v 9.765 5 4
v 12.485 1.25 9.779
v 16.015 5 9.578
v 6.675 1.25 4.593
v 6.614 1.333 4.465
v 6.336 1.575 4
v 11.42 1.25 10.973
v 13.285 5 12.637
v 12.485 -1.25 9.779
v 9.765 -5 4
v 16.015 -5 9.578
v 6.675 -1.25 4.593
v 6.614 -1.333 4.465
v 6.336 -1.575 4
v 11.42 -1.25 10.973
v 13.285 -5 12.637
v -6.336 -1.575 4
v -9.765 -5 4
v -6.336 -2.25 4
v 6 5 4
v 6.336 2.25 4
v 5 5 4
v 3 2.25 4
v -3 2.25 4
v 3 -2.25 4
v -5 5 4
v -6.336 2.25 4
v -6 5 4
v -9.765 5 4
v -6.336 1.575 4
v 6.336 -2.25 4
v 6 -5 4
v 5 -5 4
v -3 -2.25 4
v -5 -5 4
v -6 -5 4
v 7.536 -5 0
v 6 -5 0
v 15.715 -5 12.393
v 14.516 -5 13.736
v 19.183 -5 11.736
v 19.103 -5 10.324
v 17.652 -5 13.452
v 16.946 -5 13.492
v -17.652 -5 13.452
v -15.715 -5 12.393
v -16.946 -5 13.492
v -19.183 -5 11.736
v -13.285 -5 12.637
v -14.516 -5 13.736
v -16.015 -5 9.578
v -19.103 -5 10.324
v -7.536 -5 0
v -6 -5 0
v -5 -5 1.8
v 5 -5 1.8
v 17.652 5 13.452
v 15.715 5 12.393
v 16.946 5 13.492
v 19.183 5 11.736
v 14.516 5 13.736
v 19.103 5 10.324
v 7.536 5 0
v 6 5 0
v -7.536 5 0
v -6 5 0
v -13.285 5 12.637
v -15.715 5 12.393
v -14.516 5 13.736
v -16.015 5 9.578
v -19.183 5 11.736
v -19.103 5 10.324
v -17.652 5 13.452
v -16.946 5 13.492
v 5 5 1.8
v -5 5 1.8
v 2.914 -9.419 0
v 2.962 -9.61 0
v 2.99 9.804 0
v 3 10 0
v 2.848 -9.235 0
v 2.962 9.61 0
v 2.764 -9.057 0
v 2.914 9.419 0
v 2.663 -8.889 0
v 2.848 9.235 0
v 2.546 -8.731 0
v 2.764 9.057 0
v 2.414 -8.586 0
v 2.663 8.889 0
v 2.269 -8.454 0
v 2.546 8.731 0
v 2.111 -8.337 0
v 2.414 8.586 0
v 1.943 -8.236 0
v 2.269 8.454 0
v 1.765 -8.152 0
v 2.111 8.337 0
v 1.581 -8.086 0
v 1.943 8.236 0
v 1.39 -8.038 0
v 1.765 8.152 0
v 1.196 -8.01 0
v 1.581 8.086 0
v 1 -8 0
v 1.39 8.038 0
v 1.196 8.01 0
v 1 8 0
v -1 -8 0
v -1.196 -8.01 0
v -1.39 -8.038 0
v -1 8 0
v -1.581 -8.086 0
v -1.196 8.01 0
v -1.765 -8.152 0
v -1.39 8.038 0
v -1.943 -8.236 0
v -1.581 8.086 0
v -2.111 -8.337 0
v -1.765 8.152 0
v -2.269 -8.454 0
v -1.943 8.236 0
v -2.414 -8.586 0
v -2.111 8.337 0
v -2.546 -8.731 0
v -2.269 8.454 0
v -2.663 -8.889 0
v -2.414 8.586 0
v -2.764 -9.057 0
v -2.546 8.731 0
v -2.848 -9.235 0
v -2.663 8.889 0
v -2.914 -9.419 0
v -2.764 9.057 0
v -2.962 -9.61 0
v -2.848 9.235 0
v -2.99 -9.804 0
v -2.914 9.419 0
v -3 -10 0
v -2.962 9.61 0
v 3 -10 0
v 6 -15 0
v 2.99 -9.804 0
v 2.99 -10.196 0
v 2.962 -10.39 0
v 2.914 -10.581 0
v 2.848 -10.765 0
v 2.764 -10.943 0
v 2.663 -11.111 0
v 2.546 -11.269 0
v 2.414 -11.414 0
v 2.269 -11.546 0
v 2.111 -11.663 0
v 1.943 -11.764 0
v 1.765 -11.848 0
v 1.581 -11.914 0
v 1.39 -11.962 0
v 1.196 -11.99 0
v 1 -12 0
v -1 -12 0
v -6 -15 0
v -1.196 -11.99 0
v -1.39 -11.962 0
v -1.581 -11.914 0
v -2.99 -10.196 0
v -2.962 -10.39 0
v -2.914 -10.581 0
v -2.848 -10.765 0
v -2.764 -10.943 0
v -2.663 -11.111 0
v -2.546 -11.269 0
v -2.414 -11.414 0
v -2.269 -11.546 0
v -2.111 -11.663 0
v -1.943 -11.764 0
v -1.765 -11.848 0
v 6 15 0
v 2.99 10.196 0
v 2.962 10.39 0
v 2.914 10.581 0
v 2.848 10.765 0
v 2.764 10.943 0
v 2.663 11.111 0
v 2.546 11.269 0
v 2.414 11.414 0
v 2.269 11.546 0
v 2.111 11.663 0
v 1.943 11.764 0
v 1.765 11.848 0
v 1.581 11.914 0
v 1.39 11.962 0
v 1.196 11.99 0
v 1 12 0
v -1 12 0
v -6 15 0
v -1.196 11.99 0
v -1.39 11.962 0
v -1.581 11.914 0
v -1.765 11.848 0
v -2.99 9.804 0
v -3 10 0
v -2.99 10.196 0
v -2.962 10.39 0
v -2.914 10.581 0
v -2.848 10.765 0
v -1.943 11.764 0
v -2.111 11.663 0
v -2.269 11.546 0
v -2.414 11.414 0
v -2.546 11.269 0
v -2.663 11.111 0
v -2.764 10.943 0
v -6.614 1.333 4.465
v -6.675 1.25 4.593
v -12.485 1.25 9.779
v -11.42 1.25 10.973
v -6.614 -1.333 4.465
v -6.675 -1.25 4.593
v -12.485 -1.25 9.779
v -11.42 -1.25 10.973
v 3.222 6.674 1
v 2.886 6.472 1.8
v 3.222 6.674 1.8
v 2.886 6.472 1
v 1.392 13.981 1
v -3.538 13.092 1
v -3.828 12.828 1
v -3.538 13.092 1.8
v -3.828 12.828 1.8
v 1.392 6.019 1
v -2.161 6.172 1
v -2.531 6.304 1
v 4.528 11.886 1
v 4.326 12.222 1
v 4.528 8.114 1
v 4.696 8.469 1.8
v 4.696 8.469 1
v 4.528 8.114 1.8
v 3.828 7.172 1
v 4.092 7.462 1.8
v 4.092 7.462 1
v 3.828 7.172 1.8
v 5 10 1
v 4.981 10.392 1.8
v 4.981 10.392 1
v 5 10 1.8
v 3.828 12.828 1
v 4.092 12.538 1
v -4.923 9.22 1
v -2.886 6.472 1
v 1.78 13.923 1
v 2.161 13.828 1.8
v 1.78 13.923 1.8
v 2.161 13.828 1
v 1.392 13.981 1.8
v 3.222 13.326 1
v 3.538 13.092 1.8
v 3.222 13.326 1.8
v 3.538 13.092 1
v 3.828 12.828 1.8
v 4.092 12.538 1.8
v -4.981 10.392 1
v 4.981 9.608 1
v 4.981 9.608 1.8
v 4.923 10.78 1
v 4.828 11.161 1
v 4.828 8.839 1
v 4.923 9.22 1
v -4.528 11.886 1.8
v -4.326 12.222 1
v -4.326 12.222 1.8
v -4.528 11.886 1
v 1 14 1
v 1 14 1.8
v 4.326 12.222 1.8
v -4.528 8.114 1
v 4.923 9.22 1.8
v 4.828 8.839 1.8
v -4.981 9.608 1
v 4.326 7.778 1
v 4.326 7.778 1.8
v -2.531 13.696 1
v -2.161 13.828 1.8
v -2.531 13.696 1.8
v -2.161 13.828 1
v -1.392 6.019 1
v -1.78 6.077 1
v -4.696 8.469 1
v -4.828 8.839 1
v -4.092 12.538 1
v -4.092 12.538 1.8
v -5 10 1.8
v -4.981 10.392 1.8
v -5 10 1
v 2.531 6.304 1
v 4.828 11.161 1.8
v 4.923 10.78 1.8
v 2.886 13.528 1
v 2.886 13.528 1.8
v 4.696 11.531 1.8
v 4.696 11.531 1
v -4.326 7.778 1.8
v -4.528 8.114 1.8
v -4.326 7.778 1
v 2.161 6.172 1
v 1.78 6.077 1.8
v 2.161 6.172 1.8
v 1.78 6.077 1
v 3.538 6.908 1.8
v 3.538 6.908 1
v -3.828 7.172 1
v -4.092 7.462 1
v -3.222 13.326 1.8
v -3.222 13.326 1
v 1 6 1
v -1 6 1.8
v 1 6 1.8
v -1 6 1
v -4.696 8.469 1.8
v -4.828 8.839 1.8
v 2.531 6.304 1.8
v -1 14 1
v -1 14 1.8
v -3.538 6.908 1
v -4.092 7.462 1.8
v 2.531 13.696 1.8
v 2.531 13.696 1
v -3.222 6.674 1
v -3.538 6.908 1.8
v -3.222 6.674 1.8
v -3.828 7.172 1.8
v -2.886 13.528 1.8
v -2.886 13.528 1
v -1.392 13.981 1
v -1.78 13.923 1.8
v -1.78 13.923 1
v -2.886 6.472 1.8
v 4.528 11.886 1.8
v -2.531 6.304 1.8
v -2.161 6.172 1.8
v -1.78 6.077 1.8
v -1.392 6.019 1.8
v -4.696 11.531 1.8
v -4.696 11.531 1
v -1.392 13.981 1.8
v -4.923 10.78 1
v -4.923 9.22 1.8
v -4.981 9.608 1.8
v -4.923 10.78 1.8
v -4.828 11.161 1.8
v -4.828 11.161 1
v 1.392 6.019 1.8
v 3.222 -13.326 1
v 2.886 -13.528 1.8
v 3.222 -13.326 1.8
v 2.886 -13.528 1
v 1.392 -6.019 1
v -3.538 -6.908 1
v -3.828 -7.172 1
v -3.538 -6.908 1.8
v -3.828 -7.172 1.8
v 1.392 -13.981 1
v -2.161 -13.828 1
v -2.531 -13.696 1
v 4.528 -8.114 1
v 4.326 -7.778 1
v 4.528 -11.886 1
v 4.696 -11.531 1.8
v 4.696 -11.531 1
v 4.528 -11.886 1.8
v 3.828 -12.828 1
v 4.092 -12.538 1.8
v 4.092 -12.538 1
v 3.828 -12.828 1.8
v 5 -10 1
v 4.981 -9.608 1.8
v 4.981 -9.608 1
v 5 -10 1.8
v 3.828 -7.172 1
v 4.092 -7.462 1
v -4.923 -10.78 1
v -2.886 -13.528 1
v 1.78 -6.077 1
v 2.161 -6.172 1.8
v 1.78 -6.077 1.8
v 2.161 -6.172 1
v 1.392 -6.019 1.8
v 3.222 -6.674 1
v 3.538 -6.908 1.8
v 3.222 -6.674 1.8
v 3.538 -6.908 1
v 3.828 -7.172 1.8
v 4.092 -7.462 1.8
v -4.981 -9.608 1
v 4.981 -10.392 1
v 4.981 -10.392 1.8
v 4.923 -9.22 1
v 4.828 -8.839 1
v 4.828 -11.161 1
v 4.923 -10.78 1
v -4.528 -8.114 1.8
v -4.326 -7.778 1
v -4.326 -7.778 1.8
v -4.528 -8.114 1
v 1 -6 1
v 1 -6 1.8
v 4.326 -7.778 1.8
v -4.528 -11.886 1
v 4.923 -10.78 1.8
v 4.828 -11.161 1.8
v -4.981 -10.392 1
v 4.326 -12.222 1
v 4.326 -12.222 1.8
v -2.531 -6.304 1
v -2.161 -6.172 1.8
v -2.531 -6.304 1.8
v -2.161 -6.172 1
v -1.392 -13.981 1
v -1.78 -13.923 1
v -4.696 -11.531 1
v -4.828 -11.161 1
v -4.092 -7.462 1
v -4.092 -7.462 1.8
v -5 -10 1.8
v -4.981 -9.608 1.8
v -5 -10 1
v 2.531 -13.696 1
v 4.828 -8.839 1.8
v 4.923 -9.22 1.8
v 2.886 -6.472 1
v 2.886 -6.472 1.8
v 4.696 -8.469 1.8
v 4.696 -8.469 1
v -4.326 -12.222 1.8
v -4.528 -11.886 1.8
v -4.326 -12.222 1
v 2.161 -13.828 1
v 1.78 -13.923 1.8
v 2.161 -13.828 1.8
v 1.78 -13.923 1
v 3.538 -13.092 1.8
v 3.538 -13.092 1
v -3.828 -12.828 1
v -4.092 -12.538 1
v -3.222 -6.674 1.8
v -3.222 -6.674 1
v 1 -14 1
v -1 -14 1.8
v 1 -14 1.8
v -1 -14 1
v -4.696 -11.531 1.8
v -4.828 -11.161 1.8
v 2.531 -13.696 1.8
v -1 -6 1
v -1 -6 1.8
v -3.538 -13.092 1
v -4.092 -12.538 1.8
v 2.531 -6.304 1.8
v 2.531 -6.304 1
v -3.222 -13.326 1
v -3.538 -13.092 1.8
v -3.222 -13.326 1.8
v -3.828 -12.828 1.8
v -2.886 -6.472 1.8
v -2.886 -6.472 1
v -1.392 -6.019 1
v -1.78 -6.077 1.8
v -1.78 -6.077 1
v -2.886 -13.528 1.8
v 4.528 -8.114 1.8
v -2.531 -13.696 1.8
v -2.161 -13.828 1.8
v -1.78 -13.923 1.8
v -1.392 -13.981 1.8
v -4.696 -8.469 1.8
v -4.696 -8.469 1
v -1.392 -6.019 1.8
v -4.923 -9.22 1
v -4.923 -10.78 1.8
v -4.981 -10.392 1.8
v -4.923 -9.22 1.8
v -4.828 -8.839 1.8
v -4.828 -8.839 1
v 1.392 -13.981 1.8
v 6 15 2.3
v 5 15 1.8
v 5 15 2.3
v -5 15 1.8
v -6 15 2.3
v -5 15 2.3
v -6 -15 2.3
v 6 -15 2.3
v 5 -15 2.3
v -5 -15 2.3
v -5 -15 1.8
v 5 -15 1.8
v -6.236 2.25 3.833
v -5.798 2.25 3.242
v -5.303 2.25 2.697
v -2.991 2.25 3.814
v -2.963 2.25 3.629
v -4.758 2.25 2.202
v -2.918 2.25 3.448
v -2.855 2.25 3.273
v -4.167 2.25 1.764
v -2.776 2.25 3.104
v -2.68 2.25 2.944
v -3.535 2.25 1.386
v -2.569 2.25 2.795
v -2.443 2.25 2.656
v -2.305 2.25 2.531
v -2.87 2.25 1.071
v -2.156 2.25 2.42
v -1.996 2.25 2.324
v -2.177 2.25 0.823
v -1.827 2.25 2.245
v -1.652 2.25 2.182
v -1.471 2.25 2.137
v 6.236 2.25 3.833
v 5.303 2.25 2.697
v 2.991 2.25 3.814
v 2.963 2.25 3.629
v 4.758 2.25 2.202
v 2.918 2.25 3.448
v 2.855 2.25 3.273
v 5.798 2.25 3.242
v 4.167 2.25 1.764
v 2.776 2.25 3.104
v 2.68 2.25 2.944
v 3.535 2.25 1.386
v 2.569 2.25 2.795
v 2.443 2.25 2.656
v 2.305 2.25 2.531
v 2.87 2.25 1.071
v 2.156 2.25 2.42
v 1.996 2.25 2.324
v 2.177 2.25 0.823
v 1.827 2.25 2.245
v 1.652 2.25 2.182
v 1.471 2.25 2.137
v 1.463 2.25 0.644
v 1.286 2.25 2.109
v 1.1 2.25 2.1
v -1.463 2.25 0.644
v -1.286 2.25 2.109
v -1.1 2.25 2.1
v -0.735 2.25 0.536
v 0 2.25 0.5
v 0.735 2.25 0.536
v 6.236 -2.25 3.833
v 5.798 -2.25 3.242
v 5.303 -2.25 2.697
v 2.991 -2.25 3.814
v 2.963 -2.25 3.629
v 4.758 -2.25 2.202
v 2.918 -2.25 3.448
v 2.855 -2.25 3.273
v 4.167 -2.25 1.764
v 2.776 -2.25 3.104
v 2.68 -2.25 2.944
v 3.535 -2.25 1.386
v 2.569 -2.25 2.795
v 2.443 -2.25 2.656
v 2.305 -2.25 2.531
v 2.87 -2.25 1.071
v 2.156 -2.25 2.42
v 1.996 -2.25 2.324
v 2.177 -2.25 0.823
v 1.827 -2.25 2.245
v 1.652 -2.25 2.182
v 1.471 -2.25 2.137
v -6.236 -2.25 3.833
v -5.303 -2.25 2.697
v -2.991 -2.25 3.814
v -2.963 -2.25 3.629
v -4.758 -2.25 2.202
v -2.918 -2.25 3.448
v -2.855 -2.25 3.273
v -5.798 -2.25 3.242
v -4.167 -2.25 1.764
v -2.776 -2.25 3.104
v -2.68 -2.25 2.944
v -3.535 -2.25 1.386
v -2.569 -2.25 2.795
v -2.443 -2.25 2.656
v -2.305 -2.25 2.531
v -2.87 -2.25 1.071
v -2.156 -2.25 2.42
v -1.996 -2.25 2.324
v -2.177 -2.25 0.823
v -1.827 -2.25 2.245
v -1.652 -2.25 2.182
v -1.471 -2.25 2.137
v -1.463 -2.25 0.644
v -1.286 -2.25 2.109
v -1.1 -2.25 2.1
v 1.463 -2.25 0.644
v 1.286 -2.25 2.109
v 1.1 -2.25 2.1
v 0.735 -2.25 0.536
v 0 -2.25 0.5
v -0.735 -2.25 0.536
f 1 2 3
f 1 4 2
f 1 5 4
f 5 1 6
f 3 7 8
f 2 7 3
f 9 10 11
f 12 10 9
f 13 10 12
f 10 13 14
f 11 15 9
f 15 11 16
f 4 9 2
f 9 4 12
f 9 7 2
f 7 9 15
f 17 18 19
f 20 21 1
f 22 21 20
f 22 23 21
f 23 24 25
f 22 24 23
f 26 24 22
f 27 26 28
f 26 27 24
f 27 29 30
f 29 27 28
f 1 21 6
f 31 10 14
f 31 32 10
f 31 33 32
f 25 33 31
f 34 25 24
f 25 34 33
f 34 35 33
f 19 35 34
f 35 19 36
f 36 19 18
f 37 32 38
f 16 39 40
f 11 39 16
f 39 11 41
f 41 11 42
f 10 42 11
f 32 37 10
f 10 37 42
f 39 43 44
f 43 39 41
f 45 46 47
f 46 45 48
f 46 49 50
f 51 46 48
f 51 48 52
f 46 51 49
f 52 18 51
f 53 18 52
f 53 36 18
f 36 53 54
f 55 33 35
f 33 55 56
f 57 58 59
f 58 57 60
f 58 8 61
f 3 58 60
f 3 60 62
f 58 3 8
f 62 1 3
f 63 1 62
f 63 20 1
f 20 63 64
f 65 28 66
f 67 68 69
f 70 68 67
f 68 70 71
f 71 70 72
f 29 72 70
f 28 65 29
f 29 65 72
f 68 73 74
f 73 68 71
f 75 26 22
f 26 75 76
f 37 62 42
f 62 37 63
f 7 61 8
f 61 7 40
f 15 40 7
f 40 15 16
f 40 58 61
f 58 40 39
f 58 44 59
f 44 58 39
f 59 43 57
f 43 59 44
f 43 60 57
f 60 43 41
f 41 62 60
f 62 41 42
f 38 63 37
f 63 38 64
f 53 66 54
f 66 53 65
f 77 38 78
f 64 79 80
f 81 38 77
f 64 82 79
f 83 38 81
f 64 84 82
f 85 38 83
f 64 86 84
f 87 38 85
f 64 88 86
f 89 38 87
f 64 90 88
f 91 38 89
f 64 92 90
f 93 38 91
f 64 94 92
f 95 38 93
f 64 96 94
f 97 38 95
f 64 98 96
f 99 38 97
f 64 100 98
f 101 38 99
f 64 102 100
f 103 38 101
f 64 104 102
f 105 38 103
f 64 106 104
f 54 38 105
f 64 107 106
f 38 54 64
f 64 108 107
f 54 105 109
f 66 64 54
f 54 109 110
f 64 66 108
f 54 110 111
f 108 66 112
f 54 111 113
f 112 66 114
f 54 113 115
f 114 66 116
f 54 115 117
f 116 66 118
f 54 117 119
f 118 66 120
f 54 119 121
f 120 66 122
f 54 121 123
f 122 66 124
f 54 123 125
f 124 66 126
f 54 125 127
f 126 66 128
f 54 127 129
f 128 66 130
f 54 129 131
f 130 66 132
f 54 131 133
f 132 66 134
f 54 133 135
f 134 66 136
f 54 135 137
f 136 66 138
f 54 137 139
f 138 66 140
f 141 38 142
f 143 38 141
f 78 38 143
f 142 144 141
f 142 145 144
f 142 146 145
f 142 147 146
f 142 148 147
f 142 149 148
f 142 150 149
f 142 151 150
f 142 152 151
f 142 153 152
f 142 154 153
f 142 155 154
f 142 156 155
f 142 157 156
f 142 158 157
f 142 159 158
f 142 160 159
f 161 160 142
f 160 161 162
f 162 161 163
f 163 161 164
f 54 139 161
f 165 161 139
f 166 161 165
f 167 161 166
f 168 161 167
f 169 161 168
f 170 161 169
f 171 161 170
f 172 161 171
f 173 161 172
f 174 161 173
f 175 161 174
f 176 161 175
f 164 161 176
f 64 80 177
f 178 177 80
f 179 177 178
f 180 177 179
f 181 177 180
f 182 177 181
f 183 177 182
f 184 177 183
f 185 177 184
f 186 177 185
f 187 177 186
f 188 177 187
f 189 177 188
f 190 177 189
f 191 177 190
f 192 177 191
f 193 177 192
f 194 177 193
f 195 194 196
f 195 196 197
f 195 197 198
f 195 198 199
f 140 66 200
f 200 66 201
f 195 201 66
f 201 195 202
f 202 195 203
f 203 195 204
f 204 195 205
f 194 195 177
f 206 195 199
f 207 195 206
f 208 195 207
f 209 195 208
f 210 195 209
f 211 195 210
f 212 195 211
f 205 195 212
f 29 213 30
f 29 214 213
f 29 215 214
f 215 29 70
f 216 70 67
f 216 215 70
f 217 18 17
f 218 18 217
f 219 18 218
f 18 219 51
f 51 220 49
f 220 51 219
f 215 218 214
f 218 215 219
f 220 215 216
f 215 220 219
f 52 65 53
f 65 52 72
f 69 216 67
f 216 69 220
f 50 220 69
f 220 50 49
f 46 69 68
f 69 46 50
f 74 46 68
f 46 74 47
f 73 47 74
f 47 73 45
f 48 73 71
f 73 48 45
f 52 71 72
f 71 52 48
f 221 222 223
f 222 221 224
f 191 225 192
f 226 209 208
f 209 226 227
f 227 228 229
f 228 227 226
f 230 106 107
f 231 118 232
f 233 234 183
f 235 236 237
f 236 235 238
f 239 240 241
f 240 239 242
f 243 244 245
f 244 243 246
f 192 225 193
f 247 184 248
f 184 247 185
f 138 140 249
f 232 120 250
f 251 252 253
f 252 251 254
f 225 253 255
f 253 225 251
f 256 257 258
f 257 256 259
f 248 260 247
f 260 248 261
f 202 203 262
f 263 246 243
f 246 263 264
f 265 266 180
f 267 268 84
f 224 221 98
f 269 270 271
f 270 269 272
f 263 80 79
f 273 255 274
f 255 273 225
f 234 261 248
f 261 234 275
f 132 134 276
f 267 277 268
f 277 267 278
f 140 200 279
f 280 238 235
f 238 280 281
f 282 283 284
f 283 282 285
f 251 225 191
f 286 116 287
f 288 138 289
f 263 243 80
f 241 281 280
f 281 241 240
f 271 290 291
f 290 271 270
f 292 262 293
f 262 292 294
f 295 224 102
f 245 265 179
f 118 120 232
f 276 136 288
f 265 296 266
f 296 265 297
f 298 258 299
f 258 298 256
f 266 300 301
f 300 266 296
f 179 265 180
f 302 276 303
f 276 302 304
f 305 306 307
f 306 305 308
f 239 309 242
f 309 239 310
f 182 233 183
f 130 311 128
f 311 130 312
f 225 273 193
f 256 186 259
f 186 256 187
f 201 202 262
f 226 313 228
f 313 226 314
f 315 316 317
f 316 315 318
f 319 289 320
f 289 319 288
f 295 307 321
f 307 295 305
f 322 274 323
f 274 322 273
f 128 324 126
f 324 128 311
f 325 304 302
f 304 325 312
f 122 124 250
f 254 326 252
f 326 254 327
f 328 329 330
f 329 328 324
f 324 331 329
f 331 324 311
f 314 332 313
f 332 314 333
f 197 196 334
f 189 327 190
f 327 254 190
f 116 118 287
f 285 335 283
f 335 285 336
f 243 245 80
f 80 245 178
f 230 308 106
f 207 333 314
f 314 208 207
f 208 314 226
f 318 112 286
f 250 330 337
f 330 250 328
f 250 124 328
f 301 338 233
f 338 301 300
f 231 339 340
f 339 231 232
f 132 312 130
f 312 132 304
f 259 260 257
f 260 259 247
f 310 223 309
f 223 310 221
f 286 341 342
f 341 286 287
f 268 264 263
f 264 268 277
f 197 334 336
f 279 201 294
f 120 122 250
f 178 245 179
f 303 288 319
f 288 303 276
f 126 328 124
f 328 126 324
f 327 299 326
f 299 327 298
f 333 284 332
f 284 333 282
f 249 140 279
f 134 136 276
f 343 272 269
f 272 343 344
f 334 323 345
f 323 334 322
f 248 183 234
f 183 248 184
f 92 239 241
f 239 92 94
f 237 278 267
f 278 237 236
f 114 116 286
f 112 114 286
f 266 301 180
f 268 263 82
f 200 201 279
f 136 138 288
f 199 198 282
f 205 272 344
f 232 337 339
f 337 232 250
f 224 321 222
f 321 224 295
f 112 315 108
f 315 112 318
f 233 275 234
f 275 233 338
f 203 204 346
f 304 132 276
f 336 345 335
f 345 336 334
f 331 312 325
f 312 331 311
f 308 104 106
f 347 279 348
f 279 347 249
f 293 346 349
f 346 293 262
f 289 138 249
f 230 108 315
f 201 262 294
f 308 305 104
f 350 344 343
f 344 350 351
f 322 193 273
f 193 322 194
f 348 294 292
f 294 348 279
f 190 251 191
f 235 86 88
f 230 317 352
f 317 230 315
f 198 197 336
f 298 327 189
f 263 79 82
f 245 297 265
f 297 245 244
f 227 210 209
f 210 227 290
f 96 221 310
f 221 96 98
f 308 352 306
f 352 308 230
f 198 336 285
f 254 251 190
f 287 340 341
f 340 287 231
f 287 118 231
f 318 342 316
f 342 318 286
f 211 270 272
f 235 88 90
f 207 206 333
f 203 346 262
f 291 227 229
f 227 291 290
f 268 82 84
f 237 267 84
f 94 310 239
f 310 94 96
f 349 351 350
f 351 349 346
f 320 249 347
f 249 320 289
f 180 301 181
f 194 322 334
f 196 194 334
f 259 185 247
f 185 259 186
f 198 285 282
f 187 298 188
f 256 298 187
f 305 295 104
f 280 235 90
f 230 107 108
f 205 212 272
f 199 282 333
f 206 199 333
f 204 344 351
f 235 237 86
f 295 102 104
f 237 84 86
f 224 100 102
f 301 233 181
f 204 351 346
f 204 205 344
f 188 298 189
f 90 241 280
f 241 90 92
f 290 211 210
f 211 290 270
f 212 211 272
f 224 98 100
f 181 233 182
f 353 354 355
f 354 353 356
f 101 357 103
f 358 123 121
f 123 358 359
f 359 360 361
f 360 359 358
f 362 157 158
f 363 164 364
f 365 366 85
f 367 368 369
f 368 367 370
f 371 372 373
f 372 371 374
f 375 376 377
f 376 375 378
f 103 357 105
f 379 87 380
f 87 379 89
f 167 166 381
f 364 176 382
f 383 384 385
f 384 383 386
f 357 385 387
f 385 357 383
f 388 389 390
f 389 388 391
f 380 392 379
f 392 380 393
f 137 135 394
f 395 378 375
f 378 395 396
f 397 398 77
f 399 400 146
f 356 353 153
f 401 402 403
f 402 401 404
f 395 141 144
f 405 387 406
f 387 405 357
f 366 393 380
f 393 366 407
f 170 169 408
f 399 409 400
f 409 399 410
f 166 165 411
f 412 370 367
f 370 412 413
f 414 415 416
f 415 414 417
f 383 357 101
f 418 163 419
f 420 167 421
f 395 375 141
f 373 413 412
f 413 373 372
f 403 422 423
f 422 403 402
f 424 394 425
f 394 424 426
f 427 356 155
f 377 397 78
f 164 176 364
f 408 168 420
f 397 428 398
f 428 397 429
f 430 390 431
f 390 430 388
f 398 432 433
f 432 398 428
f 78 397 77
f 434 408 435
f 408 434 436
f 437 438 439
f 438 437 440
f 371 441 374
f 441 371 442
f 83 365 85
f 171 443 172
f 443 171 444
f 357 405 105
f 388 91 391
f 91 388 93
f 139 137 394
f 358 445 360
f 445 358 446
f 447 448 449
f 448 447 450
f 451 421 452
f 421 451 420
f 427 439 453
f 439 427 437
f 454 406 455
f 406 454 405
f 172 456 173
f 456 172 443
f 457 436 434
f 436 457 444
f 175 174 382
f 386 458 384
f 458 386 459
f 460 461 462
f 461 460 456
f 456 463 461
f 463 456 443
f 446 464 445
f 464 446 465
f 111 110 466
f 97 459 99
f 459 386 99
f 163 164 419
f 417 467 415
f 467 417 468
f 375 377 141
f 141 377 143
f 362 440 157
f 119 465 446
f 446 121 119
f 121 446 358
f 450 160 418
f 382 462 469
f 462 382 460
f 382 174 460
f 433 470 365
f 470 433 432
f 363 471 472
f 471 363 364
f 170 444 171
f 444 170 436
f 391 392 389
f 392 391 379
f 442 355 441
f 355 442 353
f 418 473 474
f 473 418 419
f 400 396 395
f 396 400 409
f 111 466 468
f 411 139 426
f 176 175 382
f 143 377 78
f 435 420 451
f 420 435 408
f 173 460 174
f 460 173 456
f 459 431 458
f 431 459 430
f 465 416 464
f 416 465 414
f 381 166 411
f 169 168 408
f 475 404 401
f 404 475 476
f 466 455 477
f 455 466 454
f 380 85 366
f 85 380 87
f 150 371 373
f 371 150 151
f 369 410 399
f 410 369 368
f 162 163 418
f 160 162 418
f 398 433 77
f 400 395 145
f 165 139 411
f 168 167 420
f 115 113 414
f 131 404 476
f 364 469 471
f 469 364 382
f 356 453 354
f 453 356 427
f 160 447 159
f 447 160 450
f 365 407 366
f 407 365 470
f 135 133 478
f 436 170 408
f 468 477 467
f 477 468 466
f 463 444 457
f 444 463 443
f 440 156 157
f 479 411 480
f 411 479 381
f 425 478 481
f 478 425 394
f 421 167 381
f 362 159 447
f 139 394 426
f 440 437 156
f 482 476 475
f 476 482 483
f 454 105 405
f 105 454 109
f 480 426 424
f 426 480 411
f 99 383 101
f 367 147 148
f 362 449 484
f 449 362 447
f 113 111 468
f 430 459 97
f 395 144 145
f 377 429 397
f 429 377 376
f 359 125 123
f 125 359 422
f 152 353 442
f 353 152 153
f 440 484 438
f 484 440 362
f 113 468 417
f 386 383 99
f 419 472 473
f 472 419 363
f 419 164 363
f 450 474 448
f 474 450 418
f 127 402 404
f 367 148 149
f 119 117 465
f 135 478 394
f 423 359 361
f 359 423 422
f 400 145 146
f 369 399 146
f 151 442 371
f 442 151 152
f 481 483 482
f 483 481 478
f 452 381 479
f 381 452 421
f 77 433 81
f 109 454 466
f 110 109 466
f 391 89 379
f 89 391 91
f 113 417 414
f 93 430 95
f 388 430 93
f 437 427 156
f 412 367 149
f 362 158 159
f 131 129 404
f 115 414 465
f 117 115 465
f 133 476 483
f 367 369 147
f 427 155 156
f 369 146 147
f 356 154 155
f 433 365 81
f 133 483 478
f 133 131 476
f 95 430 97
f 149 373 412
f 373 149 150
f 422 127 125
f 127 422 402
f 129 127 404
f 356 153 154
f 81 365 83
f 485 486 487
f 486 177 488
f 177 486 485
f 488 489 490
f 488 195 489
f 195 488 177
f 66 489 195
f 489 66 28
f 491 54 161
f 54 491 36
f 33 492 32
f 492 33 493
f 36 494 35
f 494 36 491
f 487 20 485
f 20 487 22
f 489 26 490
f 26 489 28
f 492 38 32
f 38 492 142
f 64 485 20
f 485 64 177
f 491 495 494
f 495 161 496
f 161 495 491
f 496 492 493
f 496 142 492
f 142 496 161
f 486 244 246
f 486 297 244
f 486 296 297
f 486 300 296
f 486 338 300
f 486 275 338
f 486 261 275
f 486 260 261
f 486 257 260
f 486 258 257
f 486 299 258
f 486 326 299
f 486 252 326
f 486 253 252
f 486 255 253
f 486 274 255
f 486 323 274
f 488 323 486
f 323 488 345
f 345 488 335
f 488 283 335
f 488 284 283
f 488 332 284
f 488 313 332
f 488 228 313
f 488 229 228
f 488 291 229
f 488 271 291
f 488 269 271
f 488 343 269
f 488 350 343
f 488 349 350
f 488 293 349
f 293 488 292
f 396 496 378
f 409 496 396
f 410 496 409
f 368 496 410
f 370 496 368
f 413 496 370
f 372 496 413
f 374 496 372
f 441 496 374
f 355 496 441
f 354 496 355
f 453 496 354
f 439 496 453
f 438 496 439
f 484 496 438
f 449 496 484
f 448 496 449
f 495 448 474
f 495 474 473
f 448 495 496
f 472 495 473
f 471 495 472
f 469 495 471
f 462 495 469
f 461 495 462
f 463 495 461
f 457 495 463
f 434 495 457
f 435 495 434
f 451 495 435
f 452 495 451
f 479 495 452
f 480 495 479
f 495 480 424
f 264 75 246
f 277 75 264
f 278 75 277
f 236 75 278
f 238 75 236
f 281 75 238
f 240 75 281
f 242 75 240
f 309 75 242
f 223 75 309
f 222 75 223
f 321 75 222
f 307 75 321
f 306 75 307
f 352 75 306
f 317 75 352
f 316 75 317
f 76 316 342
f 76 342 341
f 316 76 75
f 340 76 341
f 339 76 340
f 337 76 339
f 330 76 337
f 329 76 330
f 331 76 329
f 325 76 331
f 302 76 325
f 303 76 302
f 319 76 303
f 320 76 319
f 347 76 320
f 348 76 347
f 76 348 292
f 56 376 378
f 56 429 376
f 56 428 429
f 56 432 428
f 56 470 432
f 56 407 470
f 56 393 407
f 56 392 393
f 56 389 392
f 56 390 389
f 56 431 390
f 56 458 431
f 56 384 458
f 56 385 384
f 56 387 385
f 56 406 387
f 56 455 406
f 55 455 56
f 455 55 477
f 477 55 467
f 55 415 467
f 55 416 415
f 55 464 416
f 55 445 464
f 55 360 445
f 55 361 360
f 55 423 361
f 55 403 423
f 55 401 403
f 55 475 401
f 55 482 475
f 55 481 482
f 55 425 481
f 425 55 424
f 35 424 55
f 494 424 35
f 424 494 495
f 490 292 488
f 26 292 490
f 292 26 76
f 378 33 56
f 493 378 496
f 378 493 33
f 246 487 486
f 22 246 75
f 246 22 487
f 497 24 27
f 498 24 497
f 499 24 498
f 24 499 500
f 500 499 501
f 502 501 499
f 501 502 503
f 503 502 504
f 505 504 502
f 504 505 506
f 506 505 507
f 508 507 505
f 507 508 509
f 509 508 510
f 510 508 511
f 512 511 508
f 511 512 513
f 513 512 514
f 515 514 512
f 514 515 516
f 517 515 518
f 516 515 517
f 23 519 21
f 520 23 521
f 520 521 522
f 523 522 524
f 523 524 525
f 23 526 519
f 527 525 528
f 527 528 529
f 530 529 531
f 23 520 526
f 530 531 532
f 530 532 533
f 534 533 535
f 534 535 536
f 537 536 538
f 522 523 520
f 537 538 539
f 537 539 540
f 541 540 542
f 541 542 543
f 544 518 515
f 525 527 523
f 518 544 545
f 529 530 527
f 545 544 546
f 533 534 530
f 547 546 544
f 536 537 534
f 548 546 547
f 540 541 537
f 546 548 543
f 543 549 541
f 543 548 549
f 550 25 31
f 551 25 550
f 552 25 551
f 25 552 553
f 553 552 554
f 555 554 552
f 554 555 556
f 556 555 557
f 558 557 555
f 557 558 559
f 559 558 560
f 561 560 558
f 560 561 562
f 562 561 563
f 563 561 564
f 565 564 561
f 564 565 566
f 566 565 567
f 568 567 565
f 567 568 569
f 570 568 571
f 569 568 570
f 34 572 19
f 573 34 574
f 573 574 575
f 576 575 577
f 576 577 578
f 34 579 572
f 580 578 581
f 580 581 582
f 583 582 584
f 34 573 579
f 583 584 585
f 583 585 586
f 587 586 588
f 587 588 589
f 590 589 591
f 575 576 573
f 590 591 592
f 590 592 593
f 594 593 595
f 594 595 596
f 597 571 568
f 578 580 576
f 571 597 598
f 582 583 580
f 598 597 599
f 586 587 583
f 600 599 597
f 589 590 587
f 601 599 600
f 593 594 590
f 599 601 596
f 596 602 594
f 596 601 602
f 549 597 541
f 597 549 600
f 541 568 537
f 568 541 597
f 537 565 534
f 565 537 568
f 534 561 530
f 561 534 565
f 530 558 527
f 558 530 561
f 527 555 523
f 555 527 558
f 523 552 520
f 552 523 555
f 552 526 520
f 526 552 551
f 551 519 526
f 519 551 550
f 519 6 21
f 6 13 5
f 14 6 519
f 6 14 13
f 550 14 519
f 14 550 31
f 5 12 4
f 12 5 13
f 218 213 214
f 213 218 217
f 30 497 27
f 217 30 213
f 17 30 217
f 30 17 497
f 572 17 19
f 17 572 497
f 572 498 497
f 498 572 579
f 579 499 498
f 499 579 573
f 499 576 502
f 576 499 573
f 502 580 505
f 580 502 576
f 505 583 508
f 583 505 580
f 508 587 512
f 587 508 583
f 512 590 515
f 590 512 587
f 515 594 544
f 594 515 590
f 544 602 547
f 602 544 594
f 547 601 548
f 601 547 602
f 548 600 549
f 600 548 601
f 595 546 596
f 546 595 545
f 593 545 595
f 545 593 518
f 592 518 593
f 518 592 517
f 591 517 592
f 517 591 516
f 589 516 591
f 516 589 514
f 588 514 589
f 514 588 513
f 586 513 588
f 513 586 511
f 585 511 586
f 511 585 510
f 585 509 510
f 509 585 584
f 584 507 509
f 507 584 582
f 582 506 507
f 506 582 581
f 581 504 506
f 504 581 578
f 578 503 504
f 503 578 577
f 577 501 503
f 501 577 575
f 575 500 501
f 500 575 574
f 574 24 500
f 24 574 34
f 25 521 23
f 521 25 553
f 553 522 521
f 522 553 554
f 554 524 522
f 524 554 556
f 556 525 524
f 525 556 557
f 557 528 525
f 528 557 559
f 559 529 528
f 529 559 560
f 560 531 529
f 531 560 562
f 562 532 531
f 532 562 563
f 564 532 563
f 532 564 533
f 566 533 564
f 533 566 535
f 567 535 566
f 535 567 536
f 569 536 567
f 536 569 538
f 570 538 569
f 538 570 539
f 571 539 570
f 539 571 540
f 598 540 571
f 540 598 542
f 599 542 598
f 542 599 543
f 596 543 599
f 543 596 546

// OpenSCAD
$fn = 64;

part = "mid"; // end, mid

a =  1.3; // ANGLE_PROFILE_THICKNESS
b =  1.0;
c =  2.0;
d =  1.8;
e =  1.5;
f =  1.0;
g =  0.5;
h =  1.5;
i =  2.5;
j = 10.0;
k =  2.5;
l =  part=="mid"?0.0:1.6;
m = 25.4; // ANGLE_PROFILE_SIZE
n =  4.0; // bottom
o =  1.8; // foot bottom

r = 10.0; // foot with
s =  1.0; // foot wall thickness
p = 20.0; // screw distancemodel
q =  0.5; // foot edge
u =  4.0;
k =  2.5;
v =  8.0;
w =  5.0;
aa = 0.0;
bb = 2.0; // screw slide
cc = d*2;

dd = 4.5; // ti-rib width
ee = 1.6; // ti-rib height
ff = 0.5; // ti-rib bottom
jj = 83.5; // ANGLE_PROFILE_ANGLE
jja = 90;
ii = 30.0;
gg =  6.0;
hh =  15.0;
kk = 4.0;

aa =  0.8;
ab =  7.25 - a;
ac =  2.5 - a;
ad = 22.8;
ae =  1.2;
ai = max(m, ad+ac*2)+1.5;
af = 0.8;
ag = 0.8;


case_inner_pcb_rotloc() rotate(180,[1,0,0]) rotate(90, [1,0,0]) {
    cube([ad,100.5, ae], center=true);
    translate([-5.77, -42.12, ae/2]) power_jack();
    translate([-2.18,23.74,-ae/2]) rotate(180, [1,0,0]) {
        linear_extrude(6.51) square([14.8,4.8],true);
    }
    #translate([6.42,-46.09, ae/2]) screw_terminal_2_45mm(3);
    translate([-8.63,45.60, ae/2]) rotate(180) {
        screw_terminal_2_45mm(2);
    }
    translate([-2.09,45.60, ae/2]) rotate(180) {
        screw_terminal_2_45mm(2);
    }
    translate([7.17,-20.44]) cylinder(d=1.5, h=20);
}

module screw_terminal_2_45mm(p=2,h1=5,h2=20) {
    sphere();
    for(i=[0:p-1]) translate([-i*2.54,0]) {
        cylinder(2.54-0.8,h=h2);
        rotate(180) {
            translate([-1,3.3, 0.5]) cube([2,h1,4]);
        }
    }
}


difference() {
    linear_extrude(83) case_outer_basic();
    translate([0,0,-1])linear_extrude(85) case_inner();
    translate([0,0,17.5]) case_inner_pcb_rotloc() {
        translate([-2,-6])cube([15,10,5],center=true);
    }
}

module case_outer_basic() {
    difference() {
        translate([-ai,0]) square([ai*2, ii]);
        mirror_copy() translate([0,ii]) rotate(-90+jja/2) {
            translate([0, -a/2]) square([ii+ai,ai]);
            translate([ai,1]) rotate(-90) square(ii);
        }
    }
}

module case_inner() {
    difference() {
        offset(-aa) case_outer_basic();
        case_inner_pcb_rotloc() {
            mirror_copy() translate([-ad/2,0]) {
                polygon([
                    [af, ae/2+ag],
                    [af-ac-10,ae/2+ag+ac+10],
                    [af-ac-10,-ae/2-ag-ac-10],
                    [af, -ae/2-ag]
                ]);
            }
        }
    }
    case_inner_pcb_rotloc() square([ad, ae], center=true);
}
module case_inner_pcb_rotloc() {
    translate([0,ii]) rotate(-90 - jja/2) {
        translate([ac, ab]) {
            translate([ad/2,ae/2]) {
                children();
            }
        }
    }
}

!if(part == "mid" || part == "end") {
    difference() {
        union() {
            mirror_copy([1,0,0]) grip();
            foot();
        }
        tyrib();
    }
}



module power_jack(h=2.7) {
    translate([-9.6/2, -7.2]) cube([9.6, 14.4, 11.2]);
    translate([0, 0, 6.5]) rotate(90, [1,0,0])cylinder(d=6.5, h=h+7.2);
}

module tyrib() {
    
    rotate(90, [1,0,0])linear_extrude(dd, center=true) difference() {
        hull() mirror_copy() {
            radius = n - ff + kk;
            translate([hh / 2 - radius,ff+radius]) {
                circle(radius);
            }
        }
        hull() mirror_copy() {
            radius = n - ff - ee;
            translate([gg / 2 - radius,n]) {
                circle(radius);
            }
        }
    }
}

module grip() {
    cut_below_z(0) cut_below_x(-.01) difference() {
        trans_rot() clamb_outer();
        cut_below_z(n) trans_rot() hole();
        trans_rot() %profile();
    }
}

module foot() {
    difference() {
        hull() {
            linear_extrude(o + q) {
                square([r+s*2, p+2*w], true);
            }
            linear_extrude(n) {
                square([r+s*2, j], true);
            }
        }
        translate([0,0,o]) linear_extrude(n) {
            square([r, p+2*w+1], true);
        }
        translate([0, p/2]) screw();
        translate([0,-p/2]) screw();
    }
}

module screw() {
    
    hull() mirror_copy([1,0,0]) translate([bb/2,0]){
        rotate_extrude() polygon([
            [0,  o+1],
            [v/2,  o+1],
            [v/2,  o-aa],
            [u/2,  0],
            [0,    0],
        ]);
    }
    hull() mirror_copy([1,0,0]) translate([bb/2,0]){
        cylinder(d=u,1,center=true);
    }
}

module cut_below_z(z) {
    difference() {
        children();
        translate([0,0, z]) {
            mirror([0,0,1]) linear_extrude(m) {
                square(m, true);
            }
        }
    }
}

module cut_below_x(x) {
    difference() {
        children();
        rotate(90, [0,1,0])translate([-m+1,0, x]) {
            mirror([0,0,1]) linear_extrude(m) {
                square(m*2, true);
            }
        }
    }
}

module trans_rot() {
    translate([0,0,ii]) rotate(-90, [1, 0,0])rotate(45){
        rotate(-(jj-90)/2)children();
    }
}

module clamb_outer() {
    points = (part=="mid") ? [
        [m - cc   , a/2+b+i     ],
        [m - cc   , 0           ],
        [m - d    , 0           ],
        [m - d    , -a/2 - e + g],
        [m - d + g, -a/2 - e    ],
        [m + c - f, -a/2 - e    ],
        [m + c    , -a/2 - e + f],
        [m + c    , m + c + 1   ],
        [((a/2+b+i)+(m - cc))/2,
         ((a/2+b+i)+(m - cc))/2]
    ] : [
        [-a/2-b - tan(90 - jj) * (a/2+b), -a/2-b],
        [m - d    , -a/2-b      ],
        [m + c - f, -a/2-b    ],
        [m + c    , -a/2-b + f],
        [m + c    , m + c + 1   ]
    ];
    linear_extrude(j,center=true) {
        polygon(points);
    }
}

module hole() {
    translate([a/2+b,a/2+b]) {
        size=m+c-h-a/2-b;
        size1=size-2*i;
        mirror_copy([0,0,1]) hull() {
            
            translate([0,0,j/2]) cube([size, size, 1]);
            translate([i,i,k/2]) cube([size1, size1, 1]);
        }
        translate([i,i,-k])cube([size1, size1, k*2]);
    }
}
module profile() {
    if(l==0) {
        linear_extrude(j + 1, center=true) difference() {
            translate([-a/2,-a/2])square(m+a/2);
            translate([ a/2, a/2])square(m+a/2);
        }
    } else {
        mirror_copy([0,0,1])translate([0,0,l/2]) {
            linear_extrude(j/2 + 1) difference() {
                translate([-a/2,-a/2])square(m+a/2);
                translate([ a/2, a/2])square(m+a/2);
            }
        }
    }
}

module mirror_copy(vec) {
    children();
    mirror(vec) children();
}

function points_rotate(points, a) = [
    for(p=points) [
        sin(a) * p[0] + cos(a) * p[1],
        cos(a) * p[0] + -sin(a) * p[1],
    ]
];

function points_diagonal_mirror(
    points,
    sx=1,
    sy=1
) = concat(
    points, 
    [
        for(i=[len(points)-1:-1:0]) [
            sx * points[i][1],
            sy * points[i][0]
        ]
    ]
);
